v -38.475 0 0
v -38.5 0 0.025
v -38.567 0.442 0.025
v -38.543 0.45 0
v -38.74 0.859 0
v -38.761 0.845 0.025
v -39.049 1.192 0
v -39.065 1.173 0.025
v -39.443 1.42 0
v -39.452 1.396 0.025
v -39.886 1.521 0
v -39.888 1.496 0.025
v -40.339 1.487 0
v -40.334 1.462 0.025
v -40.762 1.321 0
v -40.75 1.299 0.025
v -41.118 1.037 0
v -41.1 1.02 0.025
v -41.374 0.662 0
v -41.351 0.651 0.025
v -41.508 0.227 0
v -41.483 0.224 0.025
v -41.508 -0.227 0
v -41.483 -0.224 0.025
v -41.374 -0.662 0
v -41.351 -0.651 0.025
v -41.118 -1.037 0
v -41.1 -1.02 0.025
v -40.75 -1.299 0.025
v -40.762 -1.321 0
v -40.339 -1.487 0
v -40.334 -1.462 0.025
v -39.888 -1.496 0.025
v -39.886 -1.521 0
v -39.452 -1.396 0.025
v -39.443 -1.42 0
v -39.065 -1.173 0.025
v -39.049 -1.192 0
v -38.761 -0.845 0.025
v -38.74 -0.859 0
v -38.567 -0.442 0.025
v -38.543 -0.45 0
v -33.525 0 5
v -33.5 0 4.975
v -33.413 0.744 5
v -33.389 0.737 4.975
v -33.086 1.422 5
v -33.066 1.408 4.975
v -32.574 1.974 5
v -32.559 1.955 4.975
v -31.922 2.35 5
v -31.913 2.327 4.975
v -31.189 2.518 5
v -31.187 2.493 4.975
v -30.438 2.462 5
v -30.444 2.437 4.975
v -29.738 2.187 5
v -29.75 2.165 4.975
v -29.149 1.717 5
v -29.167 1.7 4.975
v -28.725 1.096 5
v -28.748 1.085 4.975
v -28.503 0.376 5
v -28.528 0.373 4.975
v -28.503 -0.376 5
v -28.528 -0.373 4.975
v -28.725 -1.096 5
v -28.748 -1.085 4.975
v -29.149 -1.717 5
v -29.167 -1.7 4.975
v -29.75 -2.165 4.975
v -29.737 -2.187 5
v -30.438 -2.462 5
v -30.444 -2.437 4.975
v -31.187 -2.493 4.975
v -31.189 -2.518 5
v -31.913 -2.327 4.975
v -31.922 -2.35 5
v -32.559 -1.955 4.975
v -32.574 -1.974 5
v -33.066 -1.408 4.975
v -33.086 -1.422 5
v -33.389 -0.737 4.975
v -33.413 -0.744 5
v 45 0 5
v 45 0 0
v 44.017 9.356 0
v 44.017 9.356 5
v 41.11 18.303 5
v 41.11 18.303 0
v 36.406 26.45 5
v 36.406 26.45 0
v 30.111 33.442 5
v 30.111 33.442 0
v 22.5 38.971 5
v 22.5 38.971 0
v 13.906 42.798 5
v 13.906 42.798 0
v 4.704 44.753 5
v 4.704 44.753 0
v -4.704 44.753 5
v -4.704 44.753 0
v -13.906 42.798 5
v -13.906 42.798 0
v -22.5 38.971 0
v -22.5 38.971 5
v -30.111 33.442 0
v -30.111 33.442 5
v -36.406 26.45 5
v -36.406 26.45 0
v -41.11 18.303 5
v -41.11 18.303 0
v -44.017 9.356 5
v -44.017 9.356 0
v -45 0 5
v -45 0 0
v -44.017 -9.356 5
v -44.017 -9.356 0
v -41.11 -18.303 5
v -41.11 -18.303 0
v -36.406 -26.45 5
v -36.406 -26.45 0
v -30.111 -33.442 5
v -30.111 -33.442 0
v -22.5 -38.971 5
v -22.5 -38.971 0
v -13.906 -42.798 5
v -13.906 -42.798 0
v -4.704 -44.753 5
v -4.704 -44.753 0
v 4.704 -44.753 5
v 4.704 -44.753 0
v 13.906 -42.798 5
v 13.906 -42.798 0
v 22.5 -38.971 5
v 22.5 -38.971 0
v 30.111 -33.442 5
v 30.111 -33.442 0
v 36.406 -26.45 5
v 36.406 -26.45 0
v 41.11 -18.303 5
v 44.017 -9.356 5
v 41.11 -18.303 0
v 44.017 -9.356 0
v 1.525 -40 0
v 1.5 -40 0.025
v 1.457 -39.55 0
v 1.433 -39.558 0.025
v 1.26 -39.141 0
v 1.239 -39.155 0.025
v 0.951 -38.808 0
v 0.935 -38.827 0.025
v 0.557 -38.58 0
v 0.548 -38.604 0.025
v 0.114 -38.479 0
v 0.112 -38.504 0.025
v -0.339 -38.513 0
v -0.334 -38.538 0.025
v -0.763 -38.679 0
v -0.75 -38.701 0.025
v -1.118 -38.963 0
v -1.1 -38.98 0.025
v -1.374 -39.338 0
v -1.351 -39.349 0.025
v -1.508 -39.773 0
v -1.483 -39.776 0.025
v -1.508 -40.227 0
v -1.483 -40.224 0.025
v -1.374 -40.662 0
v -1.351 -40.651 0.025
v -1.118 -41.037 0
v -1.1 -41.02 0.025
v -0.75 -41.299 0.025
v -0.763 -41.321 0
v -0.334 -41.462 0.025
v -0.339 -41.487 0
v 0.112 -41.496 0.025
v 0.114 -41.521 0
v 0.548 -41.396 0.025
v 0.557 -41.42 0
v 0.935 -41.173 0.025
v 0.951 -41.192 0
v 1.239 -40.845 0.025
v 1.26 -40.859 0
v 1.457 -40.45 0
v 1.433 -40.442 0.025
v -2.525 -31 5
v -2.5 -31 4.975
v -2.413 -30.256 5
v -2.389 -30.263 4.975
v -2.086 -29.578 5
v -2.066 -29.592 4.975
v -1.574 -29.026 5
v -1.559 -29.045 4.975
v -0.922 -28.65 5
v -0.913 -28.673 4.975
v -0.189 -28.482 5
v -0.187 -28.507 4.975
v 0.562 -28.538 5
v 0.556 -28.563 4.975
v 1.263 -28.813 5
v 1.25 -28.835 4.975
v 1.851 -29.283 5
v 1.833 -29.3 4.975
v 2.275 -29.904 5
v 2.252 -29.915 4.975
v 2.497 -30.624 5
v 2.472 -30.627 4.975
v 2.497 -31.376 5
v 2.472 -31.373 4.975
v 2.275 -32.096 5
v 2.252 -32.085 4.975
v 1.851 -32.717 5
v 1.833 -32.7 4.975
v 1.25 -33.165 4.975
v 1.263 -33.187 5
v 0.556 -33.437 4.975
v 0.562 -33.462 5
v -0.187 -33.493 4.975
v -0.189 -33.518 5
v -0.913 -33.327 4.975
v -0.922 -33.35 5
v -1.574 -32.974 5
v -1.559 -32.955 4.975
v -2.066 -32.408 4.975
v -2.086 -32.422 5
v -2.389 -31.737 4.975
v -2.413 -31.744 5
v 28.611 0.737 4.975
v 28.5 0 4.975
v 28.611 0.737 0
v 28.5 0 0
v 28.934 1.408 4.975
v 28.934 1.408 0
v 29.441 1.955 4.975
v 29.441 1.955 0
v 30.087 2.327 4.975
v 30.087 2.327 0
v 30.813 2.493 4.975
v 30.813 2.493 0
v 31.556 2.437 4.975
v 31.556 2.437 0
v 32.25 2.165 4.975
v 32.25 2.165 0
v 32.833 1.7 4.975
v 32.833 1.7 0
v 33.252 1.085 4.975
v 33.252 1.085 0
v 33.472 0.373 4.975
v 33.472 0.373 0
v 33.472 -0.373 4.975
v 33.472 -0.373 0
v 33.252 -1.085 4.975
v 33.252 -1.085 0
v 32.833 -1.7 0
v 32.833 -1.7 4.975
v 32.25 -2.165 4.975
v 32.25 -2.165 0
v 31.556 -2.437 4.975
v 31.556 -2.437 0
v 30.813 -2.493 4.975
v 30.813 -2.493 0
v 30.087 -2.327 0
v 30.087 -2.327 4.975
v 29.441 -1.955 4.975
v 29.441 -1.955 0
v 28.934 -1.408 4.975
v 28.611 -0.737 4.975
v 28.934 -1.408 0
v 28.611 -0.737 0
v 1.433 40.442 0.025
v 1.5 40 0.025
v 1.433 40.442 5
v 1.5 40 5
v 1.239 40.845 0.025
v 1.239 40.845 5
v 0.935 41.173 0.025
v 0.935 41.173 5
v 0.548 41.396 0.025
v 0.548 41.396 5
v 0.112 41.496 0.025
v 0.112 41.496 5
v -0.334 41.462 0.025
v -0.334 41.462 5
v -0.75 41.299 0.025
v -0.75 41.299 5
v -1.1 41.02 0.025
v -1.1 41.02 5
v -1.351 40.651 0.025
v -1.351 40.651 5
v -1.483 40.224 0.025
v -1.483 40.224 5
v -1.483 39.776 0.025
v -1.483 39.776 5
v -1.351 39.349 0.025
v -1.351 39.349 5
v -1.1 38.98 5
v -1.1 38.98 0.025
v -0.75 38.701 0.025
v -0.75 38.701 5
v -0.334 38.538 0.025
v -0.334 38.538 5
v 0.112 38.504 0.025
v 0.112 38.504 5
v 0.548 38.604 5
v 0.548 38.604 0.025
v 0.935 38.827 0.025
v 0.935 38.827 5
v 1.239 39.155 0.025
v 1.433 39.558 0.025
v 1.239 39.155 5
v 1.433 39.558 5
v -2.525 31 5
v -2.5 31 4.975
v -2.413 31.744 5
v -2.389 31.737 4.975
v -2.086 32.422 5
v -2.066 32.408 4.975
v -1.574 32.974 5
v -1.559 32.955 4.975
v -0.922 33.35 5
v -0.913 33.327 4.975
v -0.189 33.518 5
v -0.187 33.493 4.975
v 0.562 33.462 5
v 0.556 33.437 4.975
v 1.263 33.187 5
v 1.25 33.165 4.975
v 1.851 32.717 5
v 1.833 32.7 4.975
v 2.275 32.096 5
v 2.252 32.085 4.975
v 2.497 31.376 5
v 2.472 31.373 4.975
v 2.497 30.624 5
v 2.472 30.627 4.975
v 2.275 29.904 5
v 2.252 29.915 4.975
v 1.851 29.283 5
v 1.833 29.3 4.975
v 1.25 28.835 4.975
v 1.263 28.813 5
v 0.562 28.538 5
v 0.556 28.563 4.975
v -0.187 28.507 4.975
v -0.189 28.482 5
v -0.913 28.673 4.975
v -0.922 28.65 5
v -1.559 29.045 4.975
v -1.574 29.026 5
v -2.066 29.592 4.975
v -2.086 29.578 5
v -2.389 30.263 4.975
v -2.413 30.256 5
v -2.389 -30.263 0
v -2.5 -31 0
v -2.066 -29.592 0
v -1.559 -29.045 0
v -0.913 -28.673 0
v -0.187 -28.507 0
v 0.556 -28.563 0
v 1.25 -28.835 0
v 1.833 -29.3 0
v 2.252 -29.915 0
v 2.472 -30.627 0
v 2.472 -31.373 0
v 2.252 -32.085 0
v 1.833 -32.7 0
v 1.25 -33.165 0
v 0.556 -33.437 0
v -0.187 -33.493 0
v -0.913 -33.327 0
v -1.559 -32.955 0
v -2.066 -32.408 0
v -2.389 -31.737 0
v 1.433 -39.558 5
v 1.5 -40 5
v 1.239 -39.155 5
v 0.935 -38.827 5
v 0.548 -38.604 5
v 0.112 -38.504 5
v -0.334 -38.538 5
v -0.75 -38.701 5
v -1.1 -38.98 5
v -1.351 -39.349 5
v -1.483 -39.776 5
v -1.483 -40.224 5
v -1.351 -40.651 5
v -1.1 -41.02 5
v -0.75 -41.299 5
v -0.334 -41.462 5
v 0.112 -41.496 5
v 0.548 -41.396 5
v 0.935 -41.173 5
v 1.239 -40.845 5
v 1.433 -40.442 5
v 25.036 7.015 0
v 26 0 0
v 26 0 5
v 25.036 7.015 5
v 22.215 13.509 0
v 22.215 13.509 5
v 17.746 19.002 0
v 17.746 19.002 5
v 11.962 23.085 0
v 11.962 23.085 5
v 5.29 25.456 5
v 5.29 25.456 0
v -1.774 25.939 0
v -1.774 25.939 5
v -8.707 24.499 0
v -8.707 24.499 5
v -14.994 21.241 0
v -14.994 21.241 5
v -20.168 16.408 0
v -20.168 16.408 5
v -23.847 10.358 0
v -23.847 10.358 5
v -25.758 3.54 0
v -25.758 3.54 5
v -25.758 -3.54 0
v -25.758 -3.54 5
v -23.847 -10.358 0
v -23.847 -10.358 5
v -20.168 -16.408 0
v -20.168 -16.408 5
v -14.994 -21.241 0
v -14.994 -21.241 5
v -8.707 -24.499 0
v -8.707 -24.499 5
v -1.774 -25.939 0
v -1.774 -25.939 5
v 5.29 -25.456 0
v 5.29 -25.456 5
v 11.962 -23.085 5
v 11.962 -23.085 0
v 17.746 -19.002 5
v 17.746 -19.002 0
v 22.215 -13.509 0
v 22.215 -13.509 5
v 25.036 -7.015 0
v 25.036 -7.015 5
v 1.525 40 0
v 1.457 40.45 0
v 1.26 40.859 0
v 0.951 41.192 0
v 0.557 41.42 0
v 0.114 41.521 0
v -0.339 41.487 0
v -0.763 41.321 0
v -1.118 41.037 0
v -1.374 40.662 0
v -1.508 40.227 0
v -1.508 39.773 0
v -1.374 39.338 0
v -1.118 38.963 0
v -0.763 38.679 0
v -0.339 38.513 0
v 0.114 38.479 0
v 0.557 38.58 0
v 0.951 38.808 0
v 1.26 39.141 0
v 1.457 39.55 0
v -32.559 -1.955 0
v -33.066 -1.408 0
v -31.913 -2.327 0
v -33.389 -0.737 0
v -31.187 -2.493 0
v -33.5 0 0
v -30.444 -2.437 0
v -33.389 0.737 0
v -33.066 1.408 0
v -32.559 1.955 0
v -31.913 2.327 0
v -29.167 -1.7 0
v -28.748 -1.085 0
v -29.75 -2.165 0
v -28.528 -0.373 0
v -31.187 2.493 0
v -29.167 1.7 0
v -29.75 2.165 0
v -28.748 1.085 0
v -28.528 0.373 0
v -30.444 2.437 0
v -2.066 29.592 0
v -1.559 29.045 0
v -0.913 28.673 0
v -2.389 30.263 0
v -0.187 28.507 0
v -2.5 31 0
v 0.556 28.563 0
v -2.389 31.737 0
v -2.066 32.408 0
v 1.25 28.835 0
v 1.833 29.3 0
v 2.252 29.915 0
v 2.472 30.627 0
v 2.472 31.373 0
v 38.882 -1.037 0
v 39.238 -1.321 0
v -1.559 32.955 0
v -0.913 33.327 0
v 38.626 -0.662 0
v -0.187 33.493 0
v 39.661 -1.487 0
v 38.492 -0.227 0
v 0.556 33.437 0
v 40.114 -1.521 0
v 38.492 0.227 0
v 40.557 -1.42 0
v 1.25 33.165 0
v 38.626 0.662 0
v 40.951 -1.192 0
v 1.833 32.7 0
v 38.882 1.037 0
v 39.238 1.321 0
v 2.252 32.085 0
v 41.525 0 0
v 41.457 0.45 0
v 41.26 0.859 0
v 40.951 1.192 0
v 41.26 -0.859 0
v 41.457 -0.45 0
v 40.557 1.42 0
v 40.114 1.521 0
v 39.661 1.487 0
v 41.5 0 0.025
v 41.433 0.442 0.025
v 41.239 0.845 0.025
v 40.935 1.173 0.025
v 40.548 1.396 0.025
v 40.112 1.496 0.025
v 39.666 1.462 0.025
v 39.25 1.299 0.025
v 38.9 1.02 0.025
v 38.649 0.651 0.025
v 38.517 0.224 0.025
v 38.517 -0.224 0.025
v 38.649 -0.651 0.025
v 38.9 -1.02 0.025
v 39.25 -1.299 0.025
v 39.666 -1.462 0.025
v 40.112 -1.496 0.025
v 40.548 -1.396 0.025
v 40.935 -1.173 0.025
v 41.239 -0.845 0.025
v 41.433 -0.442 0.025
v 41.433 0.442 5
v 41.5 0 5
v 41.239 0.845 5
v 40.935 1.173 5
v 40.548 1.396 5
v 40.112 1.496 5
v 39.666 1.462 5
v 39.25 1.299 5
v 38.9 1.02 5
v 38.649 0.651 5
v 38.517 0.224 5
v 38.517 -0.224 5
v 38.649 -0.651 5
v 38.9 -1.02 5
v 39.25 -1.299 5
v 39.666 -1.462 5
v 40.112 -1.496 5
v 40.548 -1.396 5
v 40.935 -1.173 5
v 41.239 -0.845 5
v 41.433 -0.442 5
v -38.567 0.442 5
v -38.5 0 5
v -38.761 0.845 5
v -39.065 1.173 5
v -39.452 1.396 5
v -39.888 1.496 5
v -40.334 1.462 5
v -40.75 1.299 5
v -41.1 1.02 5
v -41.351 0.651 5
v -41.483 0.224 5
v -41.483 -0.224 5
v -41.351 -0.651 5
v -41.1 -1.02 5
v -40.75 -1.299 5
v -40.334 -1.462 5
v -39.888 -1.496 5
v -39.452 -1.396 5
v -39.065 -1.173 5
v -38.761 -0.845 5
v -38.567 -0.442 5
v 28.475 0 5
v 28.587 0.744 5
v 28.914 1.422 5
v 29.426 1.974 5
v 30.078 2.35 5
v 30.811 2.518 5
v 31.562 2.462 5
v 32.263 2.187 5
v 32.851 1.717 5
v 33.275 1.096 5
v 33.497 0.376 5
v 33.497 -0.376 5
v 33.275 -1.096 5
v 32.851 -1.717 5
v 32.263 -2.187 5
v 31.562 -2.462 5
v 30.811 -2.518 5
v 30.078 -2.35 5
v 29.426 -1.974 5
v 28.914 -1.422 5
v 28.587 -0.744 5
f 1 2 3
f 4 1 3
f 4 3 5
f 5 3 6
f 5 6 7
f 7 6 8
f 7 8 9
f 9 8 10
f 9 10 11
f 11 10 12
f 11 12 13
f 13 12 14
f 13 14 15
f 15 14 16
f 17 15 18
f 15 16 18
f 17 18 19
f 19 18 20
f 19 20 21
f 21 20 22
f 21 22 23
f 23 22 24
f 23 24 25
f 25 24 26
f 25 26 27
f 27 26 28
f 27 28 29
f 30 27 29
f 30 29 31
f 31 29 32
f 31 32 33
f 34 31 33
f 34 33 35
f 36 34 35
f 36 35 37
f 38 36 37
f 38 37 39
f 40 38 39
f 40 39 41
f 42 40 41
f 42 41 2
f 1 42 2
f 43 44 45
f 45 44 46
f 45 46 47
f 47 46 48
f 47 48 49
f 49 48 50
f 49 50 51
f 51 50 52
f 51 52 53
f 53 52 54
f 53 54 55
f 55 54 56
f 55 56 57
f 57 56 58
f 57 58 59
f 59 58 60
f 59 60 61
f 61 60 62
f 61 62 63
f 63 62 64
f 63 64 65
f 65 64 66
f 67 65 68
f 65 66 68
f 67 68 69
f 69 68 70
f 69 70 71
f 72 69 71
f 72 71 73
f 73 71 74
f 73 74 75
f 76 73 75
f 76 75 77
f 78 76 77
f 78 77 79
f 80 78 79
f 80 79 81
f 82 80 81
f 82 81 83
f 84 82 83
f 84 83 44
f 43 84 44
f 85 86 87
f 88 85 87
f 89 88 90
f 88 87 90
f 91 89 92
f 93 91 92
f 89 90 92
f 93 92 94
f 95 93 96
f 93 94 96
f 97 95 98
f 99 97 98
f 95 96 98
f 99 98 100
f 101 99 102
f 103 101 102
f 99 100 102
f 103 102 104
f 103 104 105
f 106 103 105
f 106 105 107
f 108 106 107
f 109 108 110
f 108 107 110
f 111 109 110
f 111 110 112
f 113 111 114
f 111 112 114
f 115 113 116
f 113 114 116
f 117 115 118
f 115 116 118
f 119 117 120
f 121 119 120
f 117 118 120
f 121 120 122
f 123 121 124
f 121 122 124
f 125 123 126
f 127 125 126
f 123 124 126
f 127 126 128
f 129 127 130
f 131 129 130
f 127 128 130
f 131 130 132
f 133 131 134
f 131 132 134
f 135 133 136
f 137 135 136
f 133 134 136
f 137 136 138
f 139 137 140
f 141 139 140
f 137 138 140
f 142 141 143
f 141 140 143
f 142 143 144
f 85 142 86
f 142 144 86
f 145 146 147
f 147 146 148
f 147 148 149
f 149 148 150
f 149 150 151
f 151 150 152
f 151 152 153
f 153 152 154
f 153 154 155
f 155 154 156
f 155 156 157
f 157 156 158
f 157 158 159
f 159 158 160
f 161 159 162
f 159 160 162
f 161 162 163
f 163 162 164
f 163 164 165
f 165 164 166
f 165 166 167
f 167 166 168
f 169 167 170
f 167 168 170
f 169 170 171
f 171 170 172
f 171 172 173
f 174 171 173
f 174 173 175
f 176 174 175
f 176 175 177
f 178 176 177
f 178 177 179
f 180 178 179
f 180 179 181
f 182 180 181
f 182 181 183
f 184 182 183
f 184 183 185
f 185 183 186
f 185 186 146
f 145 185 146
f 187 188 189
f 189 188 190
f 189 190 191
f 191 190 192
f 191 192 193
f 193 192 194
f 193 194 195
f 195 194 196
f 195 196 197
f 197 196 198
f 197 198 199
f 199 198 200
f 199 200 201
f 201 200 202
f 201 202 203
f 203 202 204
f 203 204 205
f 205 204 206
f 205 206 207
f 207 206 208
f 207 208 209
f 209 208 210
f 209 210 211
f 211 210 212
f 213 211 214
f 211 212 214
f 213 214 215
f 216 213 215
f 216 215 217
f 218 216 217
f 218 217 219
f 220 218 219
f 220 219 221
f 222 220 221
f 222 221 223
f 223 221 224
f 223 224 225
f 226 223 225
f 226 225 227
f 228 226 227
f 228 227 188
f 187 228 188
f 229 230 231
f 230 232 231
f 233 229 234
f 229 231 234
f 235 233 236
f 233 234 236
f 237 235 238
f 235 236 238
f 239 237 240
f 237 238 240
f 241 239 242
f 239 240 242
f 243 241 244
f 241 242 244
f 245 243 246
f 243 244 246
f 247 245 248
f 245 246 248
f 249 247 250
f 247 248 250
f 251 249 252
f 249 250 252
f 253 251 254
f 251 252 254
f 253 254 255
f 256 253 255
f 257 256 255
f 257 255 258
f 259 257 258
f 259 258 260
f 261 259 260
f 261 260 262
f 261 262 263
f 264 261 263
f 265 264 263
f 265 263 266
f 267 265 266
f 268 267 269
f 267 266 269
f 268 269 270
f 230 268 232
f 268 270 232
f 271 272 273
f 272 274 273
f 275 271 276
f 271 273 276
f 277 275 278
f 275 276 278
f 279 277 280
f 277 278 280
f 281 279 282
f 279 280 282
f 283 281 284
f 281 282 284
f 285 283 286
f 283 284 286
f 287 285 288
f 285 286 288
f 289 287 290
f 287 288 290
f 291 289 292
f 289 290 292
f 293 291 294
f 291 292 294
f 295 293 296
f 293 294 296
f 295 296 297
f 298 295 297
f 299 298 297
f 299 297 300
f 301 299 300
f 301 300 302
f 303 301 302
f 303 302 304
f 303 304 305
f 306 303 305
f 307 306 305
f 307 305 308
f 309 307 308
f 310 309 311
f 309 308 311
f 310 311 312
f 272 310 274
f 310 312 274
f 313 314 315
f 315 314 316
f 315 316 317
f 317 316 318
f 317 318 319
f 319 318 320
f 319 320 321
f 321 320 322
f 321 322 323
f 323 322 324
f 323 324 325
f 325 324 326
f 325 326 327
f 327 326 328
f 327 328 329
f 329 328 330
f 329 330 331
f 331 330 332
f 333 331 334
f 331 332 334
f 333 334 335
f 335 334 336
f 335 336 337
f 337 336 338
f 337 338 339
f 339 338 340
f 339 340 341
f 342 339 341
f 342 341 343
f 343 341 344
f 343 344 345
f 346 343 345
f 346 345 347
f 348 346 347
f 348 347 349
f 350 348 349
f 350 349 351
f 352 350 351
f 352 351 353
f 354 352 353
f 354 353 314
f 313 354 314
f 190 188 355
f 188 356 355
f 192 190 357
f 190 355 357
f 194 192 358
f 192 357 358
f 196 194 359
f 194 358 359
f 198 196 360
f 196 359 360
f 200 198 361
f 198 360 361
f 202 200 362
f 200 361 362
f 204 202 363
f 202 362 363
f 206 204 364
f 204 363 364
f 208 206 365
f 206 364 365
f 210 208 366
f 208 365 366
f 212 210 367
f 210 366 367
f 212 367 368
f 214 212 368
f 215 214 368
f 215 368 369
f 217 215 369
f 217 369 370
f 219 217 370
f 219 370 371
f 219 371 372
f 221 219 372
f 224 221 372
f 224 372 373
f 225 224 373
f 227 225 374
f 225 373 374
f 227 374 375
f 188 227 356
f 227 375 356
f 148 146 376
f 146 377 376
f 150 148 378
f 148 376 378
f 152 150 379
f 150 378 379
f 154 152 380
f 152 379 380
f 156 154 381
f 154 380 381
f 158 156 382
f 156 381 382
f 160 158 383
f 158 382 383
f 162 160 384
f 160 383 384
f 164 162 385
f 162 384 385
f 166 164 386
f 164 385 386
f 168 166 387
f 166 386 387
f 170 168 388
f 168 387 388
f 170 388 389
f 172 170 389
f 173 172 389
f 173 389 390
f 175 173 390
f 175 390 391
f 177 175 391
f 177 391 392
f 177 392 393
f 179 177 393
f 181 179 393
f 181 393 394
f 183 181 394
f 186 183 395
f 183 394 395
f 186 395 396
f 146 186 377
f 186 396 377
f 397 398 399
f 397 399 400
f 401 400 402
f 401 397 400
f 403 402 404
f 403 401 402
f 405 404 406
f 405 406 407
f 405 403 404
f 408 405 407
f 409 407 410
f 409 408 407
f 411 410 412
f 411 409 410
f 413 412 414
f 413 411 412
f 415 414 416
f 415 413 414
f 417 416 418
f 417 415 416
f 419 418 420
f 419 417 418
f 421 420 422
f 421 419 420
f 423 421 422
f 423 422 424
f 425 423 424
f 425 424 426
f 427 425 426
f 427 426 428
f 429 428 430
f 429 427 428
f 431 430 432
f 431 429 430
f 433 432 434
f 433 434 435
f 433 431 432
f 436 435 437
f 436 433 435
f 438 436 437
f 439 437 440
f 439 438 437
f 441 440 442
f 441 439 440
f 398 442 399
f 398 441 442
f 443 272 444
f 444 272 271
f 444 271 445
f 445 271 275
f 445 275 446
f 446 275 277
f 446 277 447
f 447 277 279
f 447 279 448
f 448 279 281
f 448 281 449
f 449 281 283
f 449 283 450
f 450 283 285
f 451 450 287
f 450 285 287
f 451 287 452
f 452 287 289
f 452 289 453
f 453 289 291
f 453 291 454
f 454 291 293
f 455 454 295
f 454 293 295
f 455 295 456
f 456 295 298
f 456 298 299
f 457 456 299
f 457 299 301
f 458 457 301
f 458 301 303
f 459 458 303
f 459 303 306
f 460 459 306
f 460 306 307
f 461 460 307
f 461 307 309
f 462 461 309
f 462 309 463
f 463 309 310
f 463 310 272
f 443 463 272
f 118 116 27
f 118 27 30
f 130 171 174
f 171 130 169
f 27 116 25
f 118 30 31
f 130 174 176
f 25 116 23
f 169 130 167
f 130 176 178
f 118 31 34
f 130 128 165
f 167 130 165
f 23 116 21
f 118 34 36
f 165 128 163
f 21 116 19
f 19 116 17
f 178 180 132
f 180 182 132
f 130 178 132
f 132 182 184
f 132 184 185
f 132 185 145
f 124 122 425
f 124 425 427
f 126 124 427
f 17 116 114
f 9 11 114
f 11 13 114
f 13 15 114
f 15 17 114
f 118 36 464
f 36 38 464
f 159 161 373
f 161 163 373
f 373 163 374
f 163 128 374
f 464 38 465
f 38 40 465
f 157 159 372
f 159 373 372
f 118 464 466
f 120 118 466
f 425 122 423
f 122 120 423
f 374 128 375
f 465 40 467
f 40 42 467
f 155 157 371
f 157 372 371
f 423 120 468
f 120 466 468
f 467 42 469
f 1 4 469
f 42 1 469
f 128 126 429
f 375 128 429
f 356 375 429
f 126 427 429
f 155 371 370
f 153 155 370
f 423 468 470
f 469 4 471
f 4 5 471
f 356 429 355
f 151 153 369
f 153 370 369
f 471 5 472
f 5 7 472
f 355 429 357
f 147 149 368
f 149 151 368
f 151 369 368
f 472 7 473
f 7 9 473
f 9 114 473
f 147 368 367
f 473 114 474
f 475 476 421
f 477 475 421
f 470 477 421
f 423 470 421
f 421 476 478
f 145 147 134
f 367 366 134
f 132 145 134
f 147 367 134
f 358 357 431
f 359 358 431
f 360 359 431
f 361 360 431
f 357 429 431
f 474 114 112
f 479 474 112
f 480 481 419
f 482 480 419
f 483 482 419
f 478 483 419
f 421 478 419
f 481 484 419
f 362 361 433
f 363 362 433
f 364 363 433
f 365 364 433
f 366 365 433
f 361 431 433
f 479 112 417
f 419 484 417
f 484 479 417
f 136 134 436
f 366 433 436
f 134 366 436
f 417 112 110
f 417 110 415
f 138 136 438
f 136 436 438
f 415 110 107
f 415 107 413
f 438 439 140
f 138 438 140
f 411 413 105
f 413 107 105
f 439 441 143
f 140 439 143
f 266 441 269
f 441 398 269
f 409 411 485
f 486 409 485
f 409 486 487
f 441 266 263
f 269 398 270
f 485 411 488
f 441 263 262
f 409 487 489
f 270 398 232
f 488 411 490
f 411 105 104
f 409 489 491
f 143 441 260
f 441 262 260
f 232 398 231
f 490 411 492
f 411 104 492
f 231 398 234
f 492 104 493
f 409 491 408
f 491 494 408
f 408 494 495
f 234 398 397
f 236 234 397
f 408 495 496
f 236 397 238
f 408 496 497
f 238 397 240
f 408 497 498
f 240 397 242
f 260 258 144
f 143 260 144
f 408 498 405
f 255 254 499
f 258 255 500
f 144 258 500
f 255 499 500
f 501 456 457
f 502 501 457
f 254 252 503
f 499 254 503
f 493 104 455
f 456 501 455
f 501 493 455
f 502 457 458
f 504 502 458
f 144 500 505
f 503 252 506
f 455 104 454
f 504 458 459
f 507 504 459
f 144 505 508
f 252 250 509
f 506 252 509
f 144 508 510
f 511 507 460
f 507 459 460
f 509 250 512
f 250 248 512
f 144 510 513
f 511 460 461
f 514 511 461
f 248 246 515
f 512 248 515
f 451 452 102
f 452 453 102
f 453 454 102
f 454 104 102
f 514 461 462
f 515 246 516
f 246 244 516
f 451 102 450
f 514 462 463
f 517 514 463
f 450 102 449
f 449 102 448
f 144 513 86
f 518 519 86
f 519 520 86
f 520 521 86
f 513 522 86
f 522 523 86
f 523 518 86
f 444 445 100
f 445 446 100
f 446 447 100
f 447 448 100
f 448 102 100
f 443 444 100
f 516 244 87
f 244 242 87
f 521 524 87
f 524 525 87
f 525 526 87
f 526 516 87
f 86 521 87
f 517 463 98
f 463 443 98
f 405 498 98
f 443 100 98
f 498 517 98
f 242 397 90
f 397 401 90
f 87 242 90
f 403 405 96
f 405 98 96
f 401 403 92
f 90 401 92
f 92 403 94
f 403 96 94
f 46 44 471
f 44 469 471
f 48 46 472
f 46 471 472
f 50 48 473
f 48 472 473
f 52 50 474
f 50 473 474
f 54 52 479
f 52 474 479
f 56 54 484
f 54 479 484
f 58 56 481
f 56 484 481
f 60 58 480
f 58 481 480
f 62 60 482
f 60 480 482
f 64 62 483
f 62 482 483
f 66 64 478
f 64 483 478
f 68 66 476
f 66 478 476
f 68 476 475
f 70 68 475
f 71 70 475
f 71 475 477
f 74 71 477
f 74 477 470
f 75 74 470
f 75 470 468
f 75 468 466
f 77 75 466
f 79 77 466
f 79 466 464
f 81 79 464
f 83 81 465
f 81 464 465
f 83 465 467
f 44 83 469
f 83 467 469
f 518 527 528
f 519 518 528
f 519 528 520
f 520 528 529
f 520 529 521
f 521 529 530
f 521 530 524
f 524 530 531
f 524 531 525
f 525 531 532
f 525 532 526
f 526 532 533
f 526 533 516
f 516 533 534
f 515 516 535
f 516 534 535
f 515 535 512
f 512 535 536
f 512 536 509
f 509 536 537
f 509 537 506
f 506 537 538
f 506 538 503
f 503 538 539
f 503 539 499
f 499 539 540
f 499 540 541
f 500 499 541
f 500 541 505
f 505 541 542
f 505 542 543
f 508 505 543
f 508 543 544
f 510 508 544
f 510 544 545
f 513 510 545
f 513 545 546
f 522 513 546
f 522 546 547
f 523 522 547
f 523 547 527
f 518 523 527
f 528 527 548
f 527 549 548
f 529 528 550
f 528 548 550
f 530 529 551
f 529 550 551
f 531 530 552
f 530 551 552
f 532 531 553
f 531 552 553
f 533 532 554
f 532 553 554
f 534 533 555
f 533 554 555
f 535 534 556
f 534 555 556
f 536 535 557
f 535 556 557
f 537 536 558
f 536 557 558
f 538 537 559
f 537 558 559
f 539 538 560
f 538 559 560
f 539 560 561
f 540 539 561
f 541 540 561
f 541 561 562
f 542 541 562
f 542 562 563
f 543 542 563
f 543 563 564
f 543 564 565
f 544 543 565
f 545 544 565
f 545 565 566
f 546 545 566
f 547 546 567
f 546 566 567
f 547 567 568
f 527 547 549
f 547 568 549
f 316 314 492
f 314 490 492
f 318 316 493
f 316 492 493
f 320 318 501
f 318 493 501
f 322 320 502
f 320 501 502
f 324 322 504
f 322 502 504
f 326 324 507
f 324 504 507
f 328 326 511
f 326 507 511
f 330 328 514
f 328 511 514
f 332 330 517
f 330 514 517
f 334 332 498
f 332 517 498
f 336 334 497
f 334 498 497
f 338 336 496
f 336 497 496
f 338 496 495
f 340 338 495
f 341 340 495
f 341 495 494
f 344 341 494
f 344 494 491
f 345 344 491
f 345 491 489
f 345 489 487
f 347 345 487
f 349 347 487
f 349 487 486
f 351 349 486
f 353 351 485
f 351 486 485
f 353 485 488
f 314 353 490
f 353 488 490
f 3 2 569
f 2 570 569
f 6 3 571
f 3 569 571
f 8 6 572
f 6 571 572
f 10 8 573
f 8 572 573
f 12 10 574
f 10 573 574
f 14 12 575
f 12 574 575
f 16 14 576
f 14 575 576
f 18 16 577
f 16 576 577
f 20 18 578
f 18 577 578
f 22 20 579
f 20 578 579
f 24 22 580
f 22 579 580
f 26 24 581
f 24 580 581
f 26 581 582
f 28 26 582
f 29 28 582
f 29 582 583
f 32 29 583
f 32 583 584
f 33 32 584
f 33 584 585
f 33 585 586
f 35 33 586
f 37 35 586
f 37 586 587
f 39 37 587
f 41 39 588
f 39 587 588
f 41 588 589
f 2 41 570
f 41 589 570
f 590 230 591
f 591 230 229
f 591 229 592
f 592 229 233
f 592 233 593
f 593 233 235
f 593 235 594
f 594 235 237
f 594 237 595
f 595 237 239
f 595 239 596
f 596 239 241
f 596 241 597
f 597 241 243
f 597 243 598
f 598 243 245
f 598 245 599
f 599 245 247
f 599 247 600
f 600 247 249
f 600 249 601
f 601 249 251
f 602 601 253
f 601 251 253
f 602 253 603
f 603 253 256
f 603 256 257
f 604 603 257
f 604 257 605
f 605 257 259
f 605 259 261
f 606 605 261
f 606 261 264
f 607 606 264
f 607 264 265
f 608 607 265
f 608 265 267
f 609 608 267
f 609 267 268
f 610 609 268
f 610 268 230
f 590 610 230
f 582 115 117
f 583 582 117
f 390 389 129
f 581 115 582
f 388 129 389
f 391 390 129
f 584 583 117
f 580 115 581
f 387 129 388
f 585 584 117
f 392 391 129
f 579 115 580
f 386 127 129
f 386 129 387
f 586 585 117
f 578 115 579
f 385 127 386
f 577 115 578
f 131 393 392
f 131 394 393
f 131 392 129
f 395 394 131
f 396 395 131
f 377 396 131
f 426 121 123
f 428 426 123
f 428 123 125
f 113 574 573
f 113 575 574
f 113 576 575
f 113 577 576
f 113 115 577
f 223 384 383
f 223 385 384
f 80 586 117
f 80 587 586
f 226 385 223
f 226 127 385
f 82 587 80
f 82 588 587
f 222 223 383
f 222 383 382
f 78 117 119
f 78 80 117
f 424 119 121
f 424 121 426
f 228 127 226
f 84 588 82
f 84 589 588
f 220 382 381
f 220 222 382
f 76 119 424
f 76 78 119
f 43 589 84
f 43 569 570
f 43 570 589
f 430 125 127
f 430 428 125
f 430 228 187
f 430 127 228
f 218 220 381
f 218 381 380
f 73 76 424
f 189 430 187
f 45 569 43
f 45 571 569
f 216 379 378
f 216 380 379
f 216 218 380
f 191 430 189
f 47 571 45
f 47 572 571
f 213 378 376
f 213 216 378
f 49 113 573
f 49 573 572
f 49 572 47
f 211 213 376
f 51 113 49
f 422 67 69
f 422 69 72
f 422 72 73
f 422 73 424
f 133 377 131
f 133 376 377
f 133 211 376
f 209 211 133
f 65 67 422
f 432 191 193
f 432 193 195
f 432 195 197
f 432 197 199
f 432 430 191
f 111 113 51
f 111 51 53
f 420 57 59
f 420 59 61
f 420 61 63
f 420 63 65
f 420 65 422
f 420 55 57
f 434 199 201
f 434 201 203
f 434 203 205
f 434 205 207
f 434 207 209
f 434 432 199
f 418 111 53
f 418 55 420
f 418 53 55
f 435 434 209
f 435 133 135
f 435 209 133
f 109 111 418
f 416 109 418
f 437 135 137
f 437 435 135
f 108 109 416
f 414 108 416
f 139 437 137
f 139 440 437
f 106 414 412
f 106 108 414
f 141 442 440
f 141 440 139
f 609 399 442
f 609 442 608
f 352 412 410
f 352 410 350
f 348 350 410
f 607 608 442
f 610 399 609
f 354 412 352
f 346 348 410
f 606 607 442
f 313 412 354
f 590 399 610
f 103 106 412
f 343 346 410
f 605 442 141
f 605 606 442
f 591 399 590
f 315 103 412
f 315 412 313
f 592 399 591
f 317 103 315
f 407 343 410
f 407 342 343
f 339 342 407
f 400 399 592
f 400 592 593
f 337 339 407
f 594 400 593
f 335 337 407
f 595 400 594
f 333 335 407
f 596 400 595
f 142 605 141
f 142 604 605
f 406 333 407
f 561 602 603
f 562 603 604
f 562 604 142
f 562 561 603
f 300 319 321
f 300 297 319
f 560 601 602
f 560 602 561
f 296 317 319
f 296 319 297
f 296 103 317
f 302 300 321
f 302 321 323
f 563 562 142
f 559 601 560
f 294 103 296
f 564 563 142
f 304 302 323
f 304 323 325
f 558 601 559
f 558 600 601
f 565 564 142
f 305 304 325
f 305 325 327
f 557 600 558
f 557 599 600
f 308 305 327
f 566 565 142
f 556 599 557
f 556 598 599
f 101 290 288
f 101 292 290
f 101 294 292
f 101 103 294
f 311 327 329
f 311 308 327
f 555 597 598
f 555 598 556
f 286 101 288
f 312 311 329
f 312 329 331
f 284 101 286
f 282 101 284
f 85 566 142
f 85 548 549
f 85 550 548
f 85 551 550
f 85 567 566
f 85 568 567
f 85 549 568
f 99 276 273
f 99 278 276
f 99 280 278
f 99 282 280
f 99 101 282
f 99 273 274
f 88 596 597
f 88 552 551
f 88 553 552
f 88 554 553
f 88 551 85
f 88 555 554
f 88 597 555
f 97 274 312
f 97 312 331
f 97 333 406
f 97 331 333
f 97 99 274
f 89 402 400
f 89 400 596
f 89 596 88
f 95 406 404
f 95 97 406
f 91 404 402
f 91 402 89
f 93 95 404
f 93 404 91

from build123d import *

# Parameters (mm, degrees)
SKETCH1_R                       = 45
SKETCH1_R_2                     = 26
BOSS_EXTRUDE1_DEPTH             = 5
F_5_0MM_DOWEL_HOLE1_D           = 5
F_5_0MM_DOWEL_HOLE1_CSINK_D     = 5.05
F_5_0MM_DOWEL_HOLE1_CSINK_ANGLE = 90
F_3_0MM_DOWEL_HOLE3_D           = 3
F_3_0MM_DOWEL_HOLE3_CSINK_D     = 3.05
F_3_0MM_DOWEL_HOLE3_CSINK_ANGLE = 90


with BuildPart() as part:
    # Sketch1 → Boss-Extrude1 (new body)
    with BuildSketch(Plane.XY):
        Circle(SKETCH1_R)
        Circle(SKETCH1_R_2, mode=Mode.SUBTRACT)
    extrude(amount=BOSS_EXTRUDE1_DEPTH)

    # Ø5.0mm Dowel Hole1 (through all)
    with Locations(Plane.XY.offset(5)):
        with Locations((0, 31), (-31, 0), (0, -31), (31, 0)):
            CounterSinkHole(F_5_0MM_DOWEL_HOLE1_D / 2, F_5_0MM_DOWEL_HOLE1_CSINK_D / 2, counter_sink_angle=F_5_0MM_DOWEL_HOLE1_CSINK_ANGLE)

    # Ø3.0mm Dowel Hole3 (through all)
    with Locations(Plane(origin=(0, 0, 0), x_dir=(-1, 0, 0), z_dir=(0, 0, -1))):
        with Locations((0, 40), (40, 0), (0, -40), (-40, 0)):
            CounterSinkHole(F_3_0MM_DOWEL_HOLE3_D / 2, F_3_0MM_DOWEL_HOLE3_CSINK_D / 2, counter_sink_angle=F_3_0MM_DOWEL_HOLE3_CSINK_ANGLE)


solid = part.part
